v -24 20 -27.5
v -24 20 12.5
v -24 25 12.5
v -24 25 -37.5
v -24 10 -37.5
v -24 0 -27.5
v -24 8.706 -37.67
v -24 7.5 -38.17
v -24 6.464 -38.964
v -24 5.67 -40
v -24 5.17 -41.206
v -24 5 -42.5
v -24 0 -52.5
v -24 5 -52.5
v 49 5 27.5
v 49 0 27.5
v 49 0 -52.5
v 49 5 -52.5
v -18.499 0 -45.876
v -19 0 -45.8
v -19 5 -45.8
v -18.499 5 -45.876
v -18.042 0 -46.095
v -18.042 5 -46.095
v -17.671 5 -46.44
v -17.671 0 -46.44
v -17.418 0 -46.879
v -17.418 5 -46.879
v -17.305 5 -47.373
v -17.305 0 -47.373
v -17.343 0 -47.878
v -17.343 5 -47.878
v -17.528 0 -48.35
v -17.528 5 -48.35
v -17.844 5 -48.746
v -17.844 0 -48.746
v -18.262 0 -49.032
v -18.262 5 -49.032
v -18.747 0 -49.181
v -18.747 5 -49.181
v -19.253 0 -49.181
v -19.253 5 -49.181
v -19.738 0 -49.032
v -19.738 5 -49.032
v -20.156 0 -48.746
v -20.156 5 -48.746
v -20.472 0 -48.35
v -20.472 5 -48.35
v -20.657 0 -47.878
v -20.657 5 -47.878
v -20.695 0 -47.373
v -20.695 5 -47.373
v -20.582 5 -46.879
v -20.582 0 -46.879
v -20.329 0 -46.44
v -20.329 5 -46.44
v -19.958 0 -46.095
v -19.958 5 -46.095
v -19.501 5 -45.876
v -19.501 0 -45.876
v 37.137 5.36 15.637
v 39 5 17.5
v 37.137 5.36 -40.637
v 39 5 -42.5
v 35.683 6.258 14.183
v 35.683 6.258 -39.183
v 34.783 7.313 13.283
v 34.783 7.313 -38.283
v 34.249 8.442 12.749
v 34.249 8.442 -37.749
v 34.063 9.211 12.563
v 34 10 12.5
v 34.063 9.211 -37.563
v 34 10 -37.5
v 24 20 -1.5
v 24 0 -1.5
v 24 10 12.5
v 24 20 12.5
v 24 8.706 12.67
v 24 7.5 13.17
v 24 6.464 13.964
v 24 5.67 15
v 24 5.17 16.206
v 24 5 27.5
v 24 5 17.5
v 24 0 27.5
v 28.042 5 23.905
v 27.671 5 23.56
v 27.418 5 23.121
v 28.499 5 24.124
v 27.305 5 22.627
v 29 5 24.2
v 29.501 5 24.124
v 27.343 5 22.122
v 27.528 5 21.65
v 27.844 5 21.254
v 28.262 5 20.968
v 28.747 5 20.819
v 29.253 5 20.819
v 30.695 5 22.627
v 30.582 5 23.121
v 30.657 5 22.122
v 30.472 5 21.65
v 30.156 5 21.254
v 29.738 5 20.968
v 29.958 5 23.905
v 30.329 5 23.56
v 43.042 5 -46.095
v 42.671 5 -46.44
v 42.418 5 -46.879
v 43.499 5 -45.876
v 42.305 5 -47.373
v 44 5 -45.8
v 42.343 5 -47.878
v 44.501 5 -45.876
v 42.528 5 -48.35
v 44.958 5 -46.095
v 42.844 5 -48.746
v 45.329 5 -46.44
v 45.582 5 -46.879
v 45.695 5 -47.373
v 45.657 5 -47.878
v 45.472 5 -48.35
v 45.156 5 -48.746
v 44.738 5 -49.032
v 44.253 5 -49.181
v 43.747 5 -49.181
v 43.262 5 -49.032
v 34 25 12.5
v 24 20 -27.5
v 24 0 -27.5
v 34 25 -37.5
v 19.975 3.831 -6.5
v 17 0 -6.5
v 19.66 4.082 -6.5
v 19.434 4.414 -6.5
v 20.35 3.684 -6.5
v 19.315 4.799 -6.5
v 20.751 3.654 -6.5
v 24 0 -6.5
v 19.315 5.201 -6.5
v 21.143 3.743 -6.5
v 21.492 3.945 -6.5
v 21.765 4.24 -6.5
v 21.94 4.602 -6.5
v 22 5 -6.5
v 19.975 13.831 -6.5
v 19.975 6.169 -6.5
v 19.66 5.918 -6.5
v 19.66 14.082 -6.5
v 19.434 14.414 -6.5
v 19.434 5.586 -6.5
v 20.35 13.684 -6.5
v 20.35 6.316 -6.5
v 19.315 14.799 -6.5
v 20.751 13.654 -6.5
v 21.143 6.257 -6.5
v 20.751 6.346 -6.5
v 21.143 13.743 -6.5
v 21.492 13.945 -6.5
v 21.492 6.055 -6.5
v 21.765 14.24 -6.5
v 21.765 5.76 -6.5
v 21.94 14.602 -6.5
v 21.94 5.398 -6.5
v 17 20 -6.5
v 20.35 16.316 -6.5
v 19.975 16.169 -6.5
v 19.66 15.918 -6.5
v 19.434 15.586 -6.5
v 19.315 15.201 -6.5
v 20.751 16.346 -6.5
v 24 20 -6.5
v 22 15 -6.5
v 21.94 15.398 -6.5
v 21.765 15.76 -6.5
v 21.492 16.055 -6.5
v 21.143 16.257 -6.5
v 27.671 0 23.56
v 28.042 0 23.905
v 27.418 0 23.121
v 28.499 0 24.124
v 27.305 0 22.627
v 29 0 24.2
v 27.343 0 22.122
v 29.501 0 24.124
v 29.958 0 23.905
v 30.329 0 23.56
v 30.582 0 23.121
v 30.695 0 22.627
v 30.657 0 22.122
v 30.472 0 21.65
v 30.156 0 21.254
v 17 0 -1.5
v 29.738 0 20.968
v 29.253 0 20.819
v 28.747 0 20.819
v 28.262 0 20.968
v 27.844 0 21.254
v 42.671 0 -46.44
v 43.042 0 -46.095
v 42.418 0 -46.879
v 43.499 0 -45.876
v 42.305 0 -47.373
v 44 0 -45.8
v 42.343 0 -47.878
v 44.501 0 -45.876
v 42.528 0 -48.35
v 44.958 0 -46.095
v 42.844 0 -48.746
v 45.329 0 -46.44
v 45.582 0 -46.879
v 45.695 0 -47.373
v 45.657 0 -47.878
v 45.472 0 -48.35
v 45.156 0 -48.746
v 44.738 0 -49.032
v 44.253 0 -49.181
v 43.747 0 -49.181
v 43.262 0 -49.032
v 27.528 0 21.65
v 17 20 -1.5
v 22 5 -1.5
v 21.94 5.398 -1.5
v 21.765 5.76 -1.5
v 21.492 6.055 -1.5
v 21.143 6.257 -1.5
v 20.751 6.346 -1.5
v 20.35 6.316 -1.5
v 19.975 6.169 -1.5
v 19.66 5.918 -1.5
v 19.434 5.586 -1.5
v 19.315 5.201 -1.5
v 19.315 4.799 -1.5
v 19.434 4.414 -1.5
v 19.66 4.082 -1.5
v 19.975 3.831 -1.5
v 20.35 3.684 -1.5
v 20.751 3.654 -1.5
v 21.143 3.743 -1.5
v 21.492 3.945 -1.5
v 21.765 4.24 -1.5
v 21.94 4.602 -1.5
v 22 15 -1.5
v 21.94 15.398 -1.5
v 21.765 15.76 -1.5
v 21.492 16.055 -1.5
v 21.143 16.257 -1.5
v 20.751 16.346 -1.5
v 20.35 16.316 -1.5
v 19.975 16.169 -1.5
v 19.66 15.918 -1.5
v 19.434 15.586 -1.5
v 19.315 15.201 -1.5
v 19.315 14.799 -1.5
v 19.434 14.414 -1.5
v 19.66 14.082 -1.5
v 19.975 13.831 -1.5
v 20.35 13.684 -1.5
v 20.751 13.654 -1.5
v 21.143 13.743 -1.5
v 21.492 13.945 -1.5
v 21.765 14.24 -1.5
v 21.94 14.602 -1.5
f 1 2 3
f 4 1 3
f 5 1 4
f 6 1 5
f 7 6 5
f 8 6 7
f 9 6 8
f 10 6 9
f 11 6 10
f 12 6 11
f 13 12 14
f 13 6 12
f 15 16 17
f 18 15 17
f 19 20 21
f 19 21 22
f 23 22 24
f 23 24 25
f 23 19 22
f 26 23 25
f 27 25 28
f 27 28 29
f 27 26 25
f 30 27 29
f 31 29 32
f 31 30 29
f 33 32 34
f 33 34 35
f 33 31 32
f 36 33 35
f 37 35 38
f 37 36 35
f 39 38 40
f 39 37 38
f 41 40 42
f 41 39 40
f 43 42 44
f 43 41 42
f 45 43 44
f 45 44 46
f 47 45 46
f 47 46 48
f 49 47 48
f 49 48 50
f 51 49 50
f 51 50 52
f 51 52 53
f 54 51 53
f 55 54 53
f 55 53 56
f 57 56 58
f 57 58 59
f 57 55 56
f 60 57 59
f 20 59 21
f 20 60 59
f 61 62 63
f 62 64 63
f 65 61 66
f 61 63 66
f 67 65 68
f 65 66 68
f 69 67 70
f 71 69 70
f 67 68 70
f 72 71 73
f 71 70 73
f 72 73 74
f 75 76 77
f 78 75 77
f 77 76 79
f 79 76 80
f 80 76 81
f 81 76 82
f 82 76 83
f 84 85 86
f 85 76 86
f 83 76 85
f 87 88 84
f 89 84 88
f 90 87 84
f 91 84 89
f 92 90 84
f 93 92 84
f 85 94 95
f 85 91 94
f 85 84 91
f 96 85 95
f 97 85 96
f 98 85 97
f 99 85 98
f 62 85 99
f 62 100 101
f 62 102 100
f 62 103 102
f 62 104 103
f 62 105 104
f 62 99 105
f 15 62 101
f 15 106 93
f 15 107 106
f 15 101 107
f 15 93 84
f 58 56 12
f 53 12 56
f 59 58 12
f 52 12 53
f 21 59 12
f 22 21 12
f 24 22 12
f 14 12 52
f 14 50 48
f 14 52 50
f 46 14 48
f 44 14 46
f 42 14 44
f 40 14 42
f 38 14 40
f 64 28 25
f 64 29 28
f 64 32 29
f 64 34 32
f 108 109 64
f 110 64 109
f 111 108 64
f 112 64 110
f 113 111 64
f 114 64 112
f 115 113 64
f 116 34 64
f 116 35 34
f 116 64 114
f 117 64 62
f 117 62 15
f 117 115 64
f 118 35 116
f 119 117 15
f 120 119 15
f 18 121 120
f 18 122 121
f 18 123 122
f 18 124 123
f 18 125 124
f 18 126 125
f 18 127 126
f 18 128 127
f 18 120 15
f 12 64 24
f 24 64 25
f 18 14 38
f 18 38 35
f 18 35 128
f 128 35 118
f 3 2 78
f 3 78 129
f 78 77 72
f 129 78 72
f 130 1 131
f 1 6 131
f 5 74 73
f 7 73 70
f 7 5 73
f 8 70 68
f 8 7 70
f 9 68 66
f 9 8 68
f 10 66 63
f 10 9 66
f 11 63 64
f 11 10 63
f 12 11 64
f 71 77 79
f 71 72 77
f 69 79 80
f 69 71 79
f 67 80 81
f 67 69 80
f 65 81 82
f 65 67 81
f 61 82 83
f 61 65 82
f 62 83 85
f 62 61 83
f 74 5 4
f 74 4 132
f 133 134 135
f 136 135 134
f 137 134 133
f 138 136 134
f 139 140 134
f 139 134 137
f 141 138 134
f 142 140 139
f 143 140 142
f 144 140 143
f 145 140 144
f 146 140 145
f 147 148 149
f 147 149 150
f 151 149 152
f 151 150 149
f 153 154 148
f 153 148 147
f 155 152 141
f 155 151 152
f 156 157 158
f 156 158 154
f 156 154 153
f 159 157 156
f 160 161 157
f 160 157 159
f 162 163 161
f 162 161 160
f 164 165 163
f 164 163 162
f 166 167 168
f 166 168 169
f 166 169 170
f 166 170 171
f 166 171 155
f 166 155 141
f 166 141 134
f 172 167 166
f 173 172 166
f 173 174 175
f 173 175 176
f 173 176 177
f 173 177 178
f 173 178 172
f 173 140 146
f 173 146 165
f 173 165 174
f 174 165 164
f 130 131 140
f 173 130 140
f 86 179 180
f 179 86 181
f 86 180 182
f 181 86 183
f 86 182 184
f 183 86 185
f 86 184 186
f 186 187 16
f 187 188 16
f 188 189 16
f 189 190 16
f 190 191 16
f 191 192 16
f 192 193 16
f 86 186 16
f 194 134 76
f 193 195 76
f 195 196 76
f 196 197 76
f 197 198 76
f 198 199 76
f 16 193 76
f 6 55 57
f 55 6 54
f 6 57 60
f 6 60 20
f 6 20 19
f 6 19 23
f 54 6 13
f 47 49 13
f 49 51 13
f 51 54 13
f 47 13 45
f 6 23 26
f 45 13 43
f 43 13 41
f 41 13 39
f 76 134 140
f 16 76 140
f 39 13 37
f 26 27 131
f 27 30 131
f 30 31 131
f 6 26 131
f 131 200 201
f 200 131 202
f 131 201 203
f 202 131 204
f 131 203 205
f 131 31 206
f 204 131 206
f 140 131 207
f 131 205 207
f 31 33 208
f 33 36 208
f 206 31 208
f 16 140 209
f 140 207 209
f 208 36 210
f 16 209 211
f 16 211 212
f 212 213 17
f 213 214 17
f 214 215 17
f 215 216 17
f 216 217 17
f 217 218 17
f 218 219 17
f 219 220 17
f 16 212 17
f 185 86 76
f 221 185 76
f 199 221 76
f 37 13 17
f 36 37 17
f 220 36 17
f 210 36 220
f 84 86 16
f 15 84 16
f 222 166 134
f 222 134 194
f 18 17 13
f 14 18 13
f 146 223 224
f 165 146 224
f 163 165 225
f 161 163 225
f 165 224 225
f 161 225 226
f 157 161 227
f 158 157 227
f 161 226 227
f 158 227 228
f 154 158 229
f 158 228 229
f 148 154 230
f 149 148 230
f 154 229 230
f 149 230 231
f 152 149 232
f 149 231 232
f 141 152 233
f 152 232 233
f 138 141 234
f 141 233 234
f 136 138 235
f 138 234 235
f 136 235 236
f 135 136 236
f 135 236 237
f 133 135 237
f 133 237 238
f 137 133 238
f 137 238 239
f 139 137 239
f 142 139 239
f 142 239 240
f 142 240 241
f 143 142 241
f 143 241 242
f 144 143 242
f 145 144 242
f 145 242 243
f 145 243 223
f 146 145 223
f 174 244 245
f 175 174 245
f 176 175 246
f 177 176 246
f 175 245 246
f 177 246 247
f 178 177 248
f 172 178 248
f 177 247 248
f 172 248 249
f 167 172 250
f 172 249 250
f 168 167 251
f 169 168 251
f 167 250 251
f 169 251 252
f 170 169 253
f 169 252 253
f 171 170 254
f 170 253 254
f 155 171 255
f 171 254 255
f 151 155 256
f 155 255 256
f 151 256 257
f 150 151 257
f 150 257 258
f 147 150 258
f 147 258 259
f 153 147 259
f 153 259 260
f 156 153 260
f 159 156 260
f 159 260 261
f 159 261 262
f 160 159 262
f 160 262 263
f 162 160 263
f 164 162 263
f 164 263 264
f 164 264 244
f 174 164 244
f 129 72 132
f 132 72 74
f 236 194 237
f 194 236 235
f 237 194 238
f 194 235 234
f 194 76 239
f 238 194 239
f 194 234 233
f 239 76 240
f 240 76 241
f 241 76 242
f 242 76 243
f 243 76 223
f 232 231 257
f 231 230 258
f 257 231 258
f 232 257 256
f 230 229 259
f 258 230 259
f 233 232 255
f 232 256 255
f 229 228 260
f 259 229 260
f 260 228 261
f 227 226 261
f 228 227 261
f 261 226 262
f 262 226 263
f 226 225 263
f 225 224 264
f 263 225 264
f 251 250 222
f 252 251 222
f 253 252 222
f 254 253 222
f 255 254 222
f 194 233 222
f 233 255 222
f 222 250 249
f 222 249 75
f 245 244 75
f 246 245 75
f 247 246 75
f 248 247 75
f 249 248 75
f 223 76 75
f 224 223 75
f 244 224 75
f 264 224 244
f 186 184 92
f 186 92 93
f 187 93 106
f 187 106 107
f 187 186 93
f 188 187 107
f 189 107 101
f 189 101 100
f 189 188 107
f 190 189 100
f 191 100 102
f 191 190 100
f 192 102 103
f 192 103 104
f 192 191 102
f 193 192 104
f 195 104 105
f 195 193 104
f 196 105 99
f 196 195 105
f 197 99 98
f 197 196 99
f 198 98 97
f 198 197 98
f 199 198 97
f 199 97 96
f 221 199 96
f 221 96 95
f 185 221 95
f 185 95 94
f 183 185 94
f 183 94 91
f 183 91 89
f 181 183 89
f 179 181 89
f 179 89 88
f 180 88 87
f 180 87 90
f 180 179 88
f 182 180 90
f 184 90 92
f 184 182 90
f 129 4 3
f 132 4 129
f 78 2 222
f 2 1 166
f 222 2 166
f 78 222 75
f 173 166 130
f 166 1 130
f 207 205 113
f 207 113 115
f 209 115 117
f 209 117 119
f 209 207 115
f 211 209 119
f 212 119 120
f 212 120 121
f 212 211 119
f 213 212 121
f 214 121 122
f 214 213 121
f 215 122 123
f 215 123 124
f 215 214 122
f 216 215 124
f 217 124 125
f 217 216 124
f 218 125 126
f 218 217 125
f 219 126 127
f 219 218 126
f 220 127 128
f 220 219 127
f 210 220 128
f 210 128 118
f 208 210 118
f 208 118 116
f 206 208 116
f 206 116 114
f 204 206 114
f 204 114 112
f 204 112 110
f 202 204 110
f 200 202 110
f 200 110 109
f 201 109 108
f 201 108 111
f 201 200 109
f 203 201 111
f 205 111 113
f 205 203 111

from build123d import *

# Parameters (mm, degrees)
SKETCH_1_R          = 1.7
EXTRUDE_1_DEPTH     = 5
EXTRUDE_2_DEPTH     = 15
SKETCH_3_W          = 58
SKETCH_3_H          = 50
EXTRUDE_3_DEPTH     = 5
SKETCH_4_W          = 5
SKETCH_4_H          = 20
EXTRUDE_4_DEPTH     = 7
SKETCH_6_R          = 1.35
CUT_EXTRUDE_1_DEPTH = 8
FILLET_1_R          = 5


with BuildPart() as part:
    # 草图1 → 凸台-拉伸1 (new body)
    with BuildSketch(Plane(origin=(0, 0, 0), x_dir=(1, 0, 0), z_dir=(0, 1, 0))):
        Polygon((24, 27.5), (24, -27.5), (49, -27.5), (49, 52.5), (-24, 52.5), (-24, 27.5), align=None)
        with Locations(Location((29, -22.5, 0), (0, 0, 270))):
            Circle(SKETCH_1_R, mode=Mode.SUBTRACT)
        with Locations(Location((44, 47.5, 0), (0, 0, 270))):
            Circle(SKETCH_1_R, mode=Mode.SUBTRACT)
        with Locations(Location((-19, 47.5, 0), (0, 0, 270))):
            Circle(SKETCH_1_R, mode=Mode.SUBTRACT)
    extrude(amount=EXTRUDE_1_DEPTH)

    # 草图2 → 凸台-拉伸2 (add)
    with BuildSketch(Plane(origin=(0, 5, 0), x_dir=(1, 0, 0), z_dir=(0, 1, 0))):
        Polygon((-24, 37.5), (-24, 27.5), (24, 27.5), (24, -12.5), (34, -12.5), (34, 37.5), align=None)
    extrude(amount=EXTRUDE_2_DEPTH)

    # 草图3 → 凸台-拉伸3 (add)
    with BuildSketch(Plane(origin=(0, 20, 0), x_dir=(1, 0, 0), z_dir=(0, 1, 0))):
        with Locations((5, 12.5)):
            Rectangle(SKETCH_3_W, SKETCH_3_H)
    extrude(amount=EXTRUDE_3_DEPTH)

    # 草图4 → 凸台-拉伸4 (add)
    with BuildSketch(Plane.ZY.offset(-24)):
        with Locations((-4, 10)):
            Rectangle(SKETCH_4_W, SKETCH_4_H)
    extrude(amount=EXTRUDE_4_DEPTH)

    # 草图6 → 切除-拉伸1 (cut)
    with BuildSketch(Plane.XY.offset(-1.5)):
        with Locations((20.65, 15)):
            Circle(SKETCH_6_R)
        with Locations((20.65, 5)):
            Circle(SKETCH_6_R)
    extrude(amount=-CUT_EXTRUDE_1_DEPTH, mode=Mode.SUBTRACT)

    # 圆角1
    fillet_1_edges = [part.edges().sort_by_distance(p)[0] for p in [
        (34, 5, -12.5),
        (5, 5, -37.5),
        (29, 5, 12.5),
    ]]
    fillet(fillet_1_edges, radius=FILLET_1_R)


solid = part.part
